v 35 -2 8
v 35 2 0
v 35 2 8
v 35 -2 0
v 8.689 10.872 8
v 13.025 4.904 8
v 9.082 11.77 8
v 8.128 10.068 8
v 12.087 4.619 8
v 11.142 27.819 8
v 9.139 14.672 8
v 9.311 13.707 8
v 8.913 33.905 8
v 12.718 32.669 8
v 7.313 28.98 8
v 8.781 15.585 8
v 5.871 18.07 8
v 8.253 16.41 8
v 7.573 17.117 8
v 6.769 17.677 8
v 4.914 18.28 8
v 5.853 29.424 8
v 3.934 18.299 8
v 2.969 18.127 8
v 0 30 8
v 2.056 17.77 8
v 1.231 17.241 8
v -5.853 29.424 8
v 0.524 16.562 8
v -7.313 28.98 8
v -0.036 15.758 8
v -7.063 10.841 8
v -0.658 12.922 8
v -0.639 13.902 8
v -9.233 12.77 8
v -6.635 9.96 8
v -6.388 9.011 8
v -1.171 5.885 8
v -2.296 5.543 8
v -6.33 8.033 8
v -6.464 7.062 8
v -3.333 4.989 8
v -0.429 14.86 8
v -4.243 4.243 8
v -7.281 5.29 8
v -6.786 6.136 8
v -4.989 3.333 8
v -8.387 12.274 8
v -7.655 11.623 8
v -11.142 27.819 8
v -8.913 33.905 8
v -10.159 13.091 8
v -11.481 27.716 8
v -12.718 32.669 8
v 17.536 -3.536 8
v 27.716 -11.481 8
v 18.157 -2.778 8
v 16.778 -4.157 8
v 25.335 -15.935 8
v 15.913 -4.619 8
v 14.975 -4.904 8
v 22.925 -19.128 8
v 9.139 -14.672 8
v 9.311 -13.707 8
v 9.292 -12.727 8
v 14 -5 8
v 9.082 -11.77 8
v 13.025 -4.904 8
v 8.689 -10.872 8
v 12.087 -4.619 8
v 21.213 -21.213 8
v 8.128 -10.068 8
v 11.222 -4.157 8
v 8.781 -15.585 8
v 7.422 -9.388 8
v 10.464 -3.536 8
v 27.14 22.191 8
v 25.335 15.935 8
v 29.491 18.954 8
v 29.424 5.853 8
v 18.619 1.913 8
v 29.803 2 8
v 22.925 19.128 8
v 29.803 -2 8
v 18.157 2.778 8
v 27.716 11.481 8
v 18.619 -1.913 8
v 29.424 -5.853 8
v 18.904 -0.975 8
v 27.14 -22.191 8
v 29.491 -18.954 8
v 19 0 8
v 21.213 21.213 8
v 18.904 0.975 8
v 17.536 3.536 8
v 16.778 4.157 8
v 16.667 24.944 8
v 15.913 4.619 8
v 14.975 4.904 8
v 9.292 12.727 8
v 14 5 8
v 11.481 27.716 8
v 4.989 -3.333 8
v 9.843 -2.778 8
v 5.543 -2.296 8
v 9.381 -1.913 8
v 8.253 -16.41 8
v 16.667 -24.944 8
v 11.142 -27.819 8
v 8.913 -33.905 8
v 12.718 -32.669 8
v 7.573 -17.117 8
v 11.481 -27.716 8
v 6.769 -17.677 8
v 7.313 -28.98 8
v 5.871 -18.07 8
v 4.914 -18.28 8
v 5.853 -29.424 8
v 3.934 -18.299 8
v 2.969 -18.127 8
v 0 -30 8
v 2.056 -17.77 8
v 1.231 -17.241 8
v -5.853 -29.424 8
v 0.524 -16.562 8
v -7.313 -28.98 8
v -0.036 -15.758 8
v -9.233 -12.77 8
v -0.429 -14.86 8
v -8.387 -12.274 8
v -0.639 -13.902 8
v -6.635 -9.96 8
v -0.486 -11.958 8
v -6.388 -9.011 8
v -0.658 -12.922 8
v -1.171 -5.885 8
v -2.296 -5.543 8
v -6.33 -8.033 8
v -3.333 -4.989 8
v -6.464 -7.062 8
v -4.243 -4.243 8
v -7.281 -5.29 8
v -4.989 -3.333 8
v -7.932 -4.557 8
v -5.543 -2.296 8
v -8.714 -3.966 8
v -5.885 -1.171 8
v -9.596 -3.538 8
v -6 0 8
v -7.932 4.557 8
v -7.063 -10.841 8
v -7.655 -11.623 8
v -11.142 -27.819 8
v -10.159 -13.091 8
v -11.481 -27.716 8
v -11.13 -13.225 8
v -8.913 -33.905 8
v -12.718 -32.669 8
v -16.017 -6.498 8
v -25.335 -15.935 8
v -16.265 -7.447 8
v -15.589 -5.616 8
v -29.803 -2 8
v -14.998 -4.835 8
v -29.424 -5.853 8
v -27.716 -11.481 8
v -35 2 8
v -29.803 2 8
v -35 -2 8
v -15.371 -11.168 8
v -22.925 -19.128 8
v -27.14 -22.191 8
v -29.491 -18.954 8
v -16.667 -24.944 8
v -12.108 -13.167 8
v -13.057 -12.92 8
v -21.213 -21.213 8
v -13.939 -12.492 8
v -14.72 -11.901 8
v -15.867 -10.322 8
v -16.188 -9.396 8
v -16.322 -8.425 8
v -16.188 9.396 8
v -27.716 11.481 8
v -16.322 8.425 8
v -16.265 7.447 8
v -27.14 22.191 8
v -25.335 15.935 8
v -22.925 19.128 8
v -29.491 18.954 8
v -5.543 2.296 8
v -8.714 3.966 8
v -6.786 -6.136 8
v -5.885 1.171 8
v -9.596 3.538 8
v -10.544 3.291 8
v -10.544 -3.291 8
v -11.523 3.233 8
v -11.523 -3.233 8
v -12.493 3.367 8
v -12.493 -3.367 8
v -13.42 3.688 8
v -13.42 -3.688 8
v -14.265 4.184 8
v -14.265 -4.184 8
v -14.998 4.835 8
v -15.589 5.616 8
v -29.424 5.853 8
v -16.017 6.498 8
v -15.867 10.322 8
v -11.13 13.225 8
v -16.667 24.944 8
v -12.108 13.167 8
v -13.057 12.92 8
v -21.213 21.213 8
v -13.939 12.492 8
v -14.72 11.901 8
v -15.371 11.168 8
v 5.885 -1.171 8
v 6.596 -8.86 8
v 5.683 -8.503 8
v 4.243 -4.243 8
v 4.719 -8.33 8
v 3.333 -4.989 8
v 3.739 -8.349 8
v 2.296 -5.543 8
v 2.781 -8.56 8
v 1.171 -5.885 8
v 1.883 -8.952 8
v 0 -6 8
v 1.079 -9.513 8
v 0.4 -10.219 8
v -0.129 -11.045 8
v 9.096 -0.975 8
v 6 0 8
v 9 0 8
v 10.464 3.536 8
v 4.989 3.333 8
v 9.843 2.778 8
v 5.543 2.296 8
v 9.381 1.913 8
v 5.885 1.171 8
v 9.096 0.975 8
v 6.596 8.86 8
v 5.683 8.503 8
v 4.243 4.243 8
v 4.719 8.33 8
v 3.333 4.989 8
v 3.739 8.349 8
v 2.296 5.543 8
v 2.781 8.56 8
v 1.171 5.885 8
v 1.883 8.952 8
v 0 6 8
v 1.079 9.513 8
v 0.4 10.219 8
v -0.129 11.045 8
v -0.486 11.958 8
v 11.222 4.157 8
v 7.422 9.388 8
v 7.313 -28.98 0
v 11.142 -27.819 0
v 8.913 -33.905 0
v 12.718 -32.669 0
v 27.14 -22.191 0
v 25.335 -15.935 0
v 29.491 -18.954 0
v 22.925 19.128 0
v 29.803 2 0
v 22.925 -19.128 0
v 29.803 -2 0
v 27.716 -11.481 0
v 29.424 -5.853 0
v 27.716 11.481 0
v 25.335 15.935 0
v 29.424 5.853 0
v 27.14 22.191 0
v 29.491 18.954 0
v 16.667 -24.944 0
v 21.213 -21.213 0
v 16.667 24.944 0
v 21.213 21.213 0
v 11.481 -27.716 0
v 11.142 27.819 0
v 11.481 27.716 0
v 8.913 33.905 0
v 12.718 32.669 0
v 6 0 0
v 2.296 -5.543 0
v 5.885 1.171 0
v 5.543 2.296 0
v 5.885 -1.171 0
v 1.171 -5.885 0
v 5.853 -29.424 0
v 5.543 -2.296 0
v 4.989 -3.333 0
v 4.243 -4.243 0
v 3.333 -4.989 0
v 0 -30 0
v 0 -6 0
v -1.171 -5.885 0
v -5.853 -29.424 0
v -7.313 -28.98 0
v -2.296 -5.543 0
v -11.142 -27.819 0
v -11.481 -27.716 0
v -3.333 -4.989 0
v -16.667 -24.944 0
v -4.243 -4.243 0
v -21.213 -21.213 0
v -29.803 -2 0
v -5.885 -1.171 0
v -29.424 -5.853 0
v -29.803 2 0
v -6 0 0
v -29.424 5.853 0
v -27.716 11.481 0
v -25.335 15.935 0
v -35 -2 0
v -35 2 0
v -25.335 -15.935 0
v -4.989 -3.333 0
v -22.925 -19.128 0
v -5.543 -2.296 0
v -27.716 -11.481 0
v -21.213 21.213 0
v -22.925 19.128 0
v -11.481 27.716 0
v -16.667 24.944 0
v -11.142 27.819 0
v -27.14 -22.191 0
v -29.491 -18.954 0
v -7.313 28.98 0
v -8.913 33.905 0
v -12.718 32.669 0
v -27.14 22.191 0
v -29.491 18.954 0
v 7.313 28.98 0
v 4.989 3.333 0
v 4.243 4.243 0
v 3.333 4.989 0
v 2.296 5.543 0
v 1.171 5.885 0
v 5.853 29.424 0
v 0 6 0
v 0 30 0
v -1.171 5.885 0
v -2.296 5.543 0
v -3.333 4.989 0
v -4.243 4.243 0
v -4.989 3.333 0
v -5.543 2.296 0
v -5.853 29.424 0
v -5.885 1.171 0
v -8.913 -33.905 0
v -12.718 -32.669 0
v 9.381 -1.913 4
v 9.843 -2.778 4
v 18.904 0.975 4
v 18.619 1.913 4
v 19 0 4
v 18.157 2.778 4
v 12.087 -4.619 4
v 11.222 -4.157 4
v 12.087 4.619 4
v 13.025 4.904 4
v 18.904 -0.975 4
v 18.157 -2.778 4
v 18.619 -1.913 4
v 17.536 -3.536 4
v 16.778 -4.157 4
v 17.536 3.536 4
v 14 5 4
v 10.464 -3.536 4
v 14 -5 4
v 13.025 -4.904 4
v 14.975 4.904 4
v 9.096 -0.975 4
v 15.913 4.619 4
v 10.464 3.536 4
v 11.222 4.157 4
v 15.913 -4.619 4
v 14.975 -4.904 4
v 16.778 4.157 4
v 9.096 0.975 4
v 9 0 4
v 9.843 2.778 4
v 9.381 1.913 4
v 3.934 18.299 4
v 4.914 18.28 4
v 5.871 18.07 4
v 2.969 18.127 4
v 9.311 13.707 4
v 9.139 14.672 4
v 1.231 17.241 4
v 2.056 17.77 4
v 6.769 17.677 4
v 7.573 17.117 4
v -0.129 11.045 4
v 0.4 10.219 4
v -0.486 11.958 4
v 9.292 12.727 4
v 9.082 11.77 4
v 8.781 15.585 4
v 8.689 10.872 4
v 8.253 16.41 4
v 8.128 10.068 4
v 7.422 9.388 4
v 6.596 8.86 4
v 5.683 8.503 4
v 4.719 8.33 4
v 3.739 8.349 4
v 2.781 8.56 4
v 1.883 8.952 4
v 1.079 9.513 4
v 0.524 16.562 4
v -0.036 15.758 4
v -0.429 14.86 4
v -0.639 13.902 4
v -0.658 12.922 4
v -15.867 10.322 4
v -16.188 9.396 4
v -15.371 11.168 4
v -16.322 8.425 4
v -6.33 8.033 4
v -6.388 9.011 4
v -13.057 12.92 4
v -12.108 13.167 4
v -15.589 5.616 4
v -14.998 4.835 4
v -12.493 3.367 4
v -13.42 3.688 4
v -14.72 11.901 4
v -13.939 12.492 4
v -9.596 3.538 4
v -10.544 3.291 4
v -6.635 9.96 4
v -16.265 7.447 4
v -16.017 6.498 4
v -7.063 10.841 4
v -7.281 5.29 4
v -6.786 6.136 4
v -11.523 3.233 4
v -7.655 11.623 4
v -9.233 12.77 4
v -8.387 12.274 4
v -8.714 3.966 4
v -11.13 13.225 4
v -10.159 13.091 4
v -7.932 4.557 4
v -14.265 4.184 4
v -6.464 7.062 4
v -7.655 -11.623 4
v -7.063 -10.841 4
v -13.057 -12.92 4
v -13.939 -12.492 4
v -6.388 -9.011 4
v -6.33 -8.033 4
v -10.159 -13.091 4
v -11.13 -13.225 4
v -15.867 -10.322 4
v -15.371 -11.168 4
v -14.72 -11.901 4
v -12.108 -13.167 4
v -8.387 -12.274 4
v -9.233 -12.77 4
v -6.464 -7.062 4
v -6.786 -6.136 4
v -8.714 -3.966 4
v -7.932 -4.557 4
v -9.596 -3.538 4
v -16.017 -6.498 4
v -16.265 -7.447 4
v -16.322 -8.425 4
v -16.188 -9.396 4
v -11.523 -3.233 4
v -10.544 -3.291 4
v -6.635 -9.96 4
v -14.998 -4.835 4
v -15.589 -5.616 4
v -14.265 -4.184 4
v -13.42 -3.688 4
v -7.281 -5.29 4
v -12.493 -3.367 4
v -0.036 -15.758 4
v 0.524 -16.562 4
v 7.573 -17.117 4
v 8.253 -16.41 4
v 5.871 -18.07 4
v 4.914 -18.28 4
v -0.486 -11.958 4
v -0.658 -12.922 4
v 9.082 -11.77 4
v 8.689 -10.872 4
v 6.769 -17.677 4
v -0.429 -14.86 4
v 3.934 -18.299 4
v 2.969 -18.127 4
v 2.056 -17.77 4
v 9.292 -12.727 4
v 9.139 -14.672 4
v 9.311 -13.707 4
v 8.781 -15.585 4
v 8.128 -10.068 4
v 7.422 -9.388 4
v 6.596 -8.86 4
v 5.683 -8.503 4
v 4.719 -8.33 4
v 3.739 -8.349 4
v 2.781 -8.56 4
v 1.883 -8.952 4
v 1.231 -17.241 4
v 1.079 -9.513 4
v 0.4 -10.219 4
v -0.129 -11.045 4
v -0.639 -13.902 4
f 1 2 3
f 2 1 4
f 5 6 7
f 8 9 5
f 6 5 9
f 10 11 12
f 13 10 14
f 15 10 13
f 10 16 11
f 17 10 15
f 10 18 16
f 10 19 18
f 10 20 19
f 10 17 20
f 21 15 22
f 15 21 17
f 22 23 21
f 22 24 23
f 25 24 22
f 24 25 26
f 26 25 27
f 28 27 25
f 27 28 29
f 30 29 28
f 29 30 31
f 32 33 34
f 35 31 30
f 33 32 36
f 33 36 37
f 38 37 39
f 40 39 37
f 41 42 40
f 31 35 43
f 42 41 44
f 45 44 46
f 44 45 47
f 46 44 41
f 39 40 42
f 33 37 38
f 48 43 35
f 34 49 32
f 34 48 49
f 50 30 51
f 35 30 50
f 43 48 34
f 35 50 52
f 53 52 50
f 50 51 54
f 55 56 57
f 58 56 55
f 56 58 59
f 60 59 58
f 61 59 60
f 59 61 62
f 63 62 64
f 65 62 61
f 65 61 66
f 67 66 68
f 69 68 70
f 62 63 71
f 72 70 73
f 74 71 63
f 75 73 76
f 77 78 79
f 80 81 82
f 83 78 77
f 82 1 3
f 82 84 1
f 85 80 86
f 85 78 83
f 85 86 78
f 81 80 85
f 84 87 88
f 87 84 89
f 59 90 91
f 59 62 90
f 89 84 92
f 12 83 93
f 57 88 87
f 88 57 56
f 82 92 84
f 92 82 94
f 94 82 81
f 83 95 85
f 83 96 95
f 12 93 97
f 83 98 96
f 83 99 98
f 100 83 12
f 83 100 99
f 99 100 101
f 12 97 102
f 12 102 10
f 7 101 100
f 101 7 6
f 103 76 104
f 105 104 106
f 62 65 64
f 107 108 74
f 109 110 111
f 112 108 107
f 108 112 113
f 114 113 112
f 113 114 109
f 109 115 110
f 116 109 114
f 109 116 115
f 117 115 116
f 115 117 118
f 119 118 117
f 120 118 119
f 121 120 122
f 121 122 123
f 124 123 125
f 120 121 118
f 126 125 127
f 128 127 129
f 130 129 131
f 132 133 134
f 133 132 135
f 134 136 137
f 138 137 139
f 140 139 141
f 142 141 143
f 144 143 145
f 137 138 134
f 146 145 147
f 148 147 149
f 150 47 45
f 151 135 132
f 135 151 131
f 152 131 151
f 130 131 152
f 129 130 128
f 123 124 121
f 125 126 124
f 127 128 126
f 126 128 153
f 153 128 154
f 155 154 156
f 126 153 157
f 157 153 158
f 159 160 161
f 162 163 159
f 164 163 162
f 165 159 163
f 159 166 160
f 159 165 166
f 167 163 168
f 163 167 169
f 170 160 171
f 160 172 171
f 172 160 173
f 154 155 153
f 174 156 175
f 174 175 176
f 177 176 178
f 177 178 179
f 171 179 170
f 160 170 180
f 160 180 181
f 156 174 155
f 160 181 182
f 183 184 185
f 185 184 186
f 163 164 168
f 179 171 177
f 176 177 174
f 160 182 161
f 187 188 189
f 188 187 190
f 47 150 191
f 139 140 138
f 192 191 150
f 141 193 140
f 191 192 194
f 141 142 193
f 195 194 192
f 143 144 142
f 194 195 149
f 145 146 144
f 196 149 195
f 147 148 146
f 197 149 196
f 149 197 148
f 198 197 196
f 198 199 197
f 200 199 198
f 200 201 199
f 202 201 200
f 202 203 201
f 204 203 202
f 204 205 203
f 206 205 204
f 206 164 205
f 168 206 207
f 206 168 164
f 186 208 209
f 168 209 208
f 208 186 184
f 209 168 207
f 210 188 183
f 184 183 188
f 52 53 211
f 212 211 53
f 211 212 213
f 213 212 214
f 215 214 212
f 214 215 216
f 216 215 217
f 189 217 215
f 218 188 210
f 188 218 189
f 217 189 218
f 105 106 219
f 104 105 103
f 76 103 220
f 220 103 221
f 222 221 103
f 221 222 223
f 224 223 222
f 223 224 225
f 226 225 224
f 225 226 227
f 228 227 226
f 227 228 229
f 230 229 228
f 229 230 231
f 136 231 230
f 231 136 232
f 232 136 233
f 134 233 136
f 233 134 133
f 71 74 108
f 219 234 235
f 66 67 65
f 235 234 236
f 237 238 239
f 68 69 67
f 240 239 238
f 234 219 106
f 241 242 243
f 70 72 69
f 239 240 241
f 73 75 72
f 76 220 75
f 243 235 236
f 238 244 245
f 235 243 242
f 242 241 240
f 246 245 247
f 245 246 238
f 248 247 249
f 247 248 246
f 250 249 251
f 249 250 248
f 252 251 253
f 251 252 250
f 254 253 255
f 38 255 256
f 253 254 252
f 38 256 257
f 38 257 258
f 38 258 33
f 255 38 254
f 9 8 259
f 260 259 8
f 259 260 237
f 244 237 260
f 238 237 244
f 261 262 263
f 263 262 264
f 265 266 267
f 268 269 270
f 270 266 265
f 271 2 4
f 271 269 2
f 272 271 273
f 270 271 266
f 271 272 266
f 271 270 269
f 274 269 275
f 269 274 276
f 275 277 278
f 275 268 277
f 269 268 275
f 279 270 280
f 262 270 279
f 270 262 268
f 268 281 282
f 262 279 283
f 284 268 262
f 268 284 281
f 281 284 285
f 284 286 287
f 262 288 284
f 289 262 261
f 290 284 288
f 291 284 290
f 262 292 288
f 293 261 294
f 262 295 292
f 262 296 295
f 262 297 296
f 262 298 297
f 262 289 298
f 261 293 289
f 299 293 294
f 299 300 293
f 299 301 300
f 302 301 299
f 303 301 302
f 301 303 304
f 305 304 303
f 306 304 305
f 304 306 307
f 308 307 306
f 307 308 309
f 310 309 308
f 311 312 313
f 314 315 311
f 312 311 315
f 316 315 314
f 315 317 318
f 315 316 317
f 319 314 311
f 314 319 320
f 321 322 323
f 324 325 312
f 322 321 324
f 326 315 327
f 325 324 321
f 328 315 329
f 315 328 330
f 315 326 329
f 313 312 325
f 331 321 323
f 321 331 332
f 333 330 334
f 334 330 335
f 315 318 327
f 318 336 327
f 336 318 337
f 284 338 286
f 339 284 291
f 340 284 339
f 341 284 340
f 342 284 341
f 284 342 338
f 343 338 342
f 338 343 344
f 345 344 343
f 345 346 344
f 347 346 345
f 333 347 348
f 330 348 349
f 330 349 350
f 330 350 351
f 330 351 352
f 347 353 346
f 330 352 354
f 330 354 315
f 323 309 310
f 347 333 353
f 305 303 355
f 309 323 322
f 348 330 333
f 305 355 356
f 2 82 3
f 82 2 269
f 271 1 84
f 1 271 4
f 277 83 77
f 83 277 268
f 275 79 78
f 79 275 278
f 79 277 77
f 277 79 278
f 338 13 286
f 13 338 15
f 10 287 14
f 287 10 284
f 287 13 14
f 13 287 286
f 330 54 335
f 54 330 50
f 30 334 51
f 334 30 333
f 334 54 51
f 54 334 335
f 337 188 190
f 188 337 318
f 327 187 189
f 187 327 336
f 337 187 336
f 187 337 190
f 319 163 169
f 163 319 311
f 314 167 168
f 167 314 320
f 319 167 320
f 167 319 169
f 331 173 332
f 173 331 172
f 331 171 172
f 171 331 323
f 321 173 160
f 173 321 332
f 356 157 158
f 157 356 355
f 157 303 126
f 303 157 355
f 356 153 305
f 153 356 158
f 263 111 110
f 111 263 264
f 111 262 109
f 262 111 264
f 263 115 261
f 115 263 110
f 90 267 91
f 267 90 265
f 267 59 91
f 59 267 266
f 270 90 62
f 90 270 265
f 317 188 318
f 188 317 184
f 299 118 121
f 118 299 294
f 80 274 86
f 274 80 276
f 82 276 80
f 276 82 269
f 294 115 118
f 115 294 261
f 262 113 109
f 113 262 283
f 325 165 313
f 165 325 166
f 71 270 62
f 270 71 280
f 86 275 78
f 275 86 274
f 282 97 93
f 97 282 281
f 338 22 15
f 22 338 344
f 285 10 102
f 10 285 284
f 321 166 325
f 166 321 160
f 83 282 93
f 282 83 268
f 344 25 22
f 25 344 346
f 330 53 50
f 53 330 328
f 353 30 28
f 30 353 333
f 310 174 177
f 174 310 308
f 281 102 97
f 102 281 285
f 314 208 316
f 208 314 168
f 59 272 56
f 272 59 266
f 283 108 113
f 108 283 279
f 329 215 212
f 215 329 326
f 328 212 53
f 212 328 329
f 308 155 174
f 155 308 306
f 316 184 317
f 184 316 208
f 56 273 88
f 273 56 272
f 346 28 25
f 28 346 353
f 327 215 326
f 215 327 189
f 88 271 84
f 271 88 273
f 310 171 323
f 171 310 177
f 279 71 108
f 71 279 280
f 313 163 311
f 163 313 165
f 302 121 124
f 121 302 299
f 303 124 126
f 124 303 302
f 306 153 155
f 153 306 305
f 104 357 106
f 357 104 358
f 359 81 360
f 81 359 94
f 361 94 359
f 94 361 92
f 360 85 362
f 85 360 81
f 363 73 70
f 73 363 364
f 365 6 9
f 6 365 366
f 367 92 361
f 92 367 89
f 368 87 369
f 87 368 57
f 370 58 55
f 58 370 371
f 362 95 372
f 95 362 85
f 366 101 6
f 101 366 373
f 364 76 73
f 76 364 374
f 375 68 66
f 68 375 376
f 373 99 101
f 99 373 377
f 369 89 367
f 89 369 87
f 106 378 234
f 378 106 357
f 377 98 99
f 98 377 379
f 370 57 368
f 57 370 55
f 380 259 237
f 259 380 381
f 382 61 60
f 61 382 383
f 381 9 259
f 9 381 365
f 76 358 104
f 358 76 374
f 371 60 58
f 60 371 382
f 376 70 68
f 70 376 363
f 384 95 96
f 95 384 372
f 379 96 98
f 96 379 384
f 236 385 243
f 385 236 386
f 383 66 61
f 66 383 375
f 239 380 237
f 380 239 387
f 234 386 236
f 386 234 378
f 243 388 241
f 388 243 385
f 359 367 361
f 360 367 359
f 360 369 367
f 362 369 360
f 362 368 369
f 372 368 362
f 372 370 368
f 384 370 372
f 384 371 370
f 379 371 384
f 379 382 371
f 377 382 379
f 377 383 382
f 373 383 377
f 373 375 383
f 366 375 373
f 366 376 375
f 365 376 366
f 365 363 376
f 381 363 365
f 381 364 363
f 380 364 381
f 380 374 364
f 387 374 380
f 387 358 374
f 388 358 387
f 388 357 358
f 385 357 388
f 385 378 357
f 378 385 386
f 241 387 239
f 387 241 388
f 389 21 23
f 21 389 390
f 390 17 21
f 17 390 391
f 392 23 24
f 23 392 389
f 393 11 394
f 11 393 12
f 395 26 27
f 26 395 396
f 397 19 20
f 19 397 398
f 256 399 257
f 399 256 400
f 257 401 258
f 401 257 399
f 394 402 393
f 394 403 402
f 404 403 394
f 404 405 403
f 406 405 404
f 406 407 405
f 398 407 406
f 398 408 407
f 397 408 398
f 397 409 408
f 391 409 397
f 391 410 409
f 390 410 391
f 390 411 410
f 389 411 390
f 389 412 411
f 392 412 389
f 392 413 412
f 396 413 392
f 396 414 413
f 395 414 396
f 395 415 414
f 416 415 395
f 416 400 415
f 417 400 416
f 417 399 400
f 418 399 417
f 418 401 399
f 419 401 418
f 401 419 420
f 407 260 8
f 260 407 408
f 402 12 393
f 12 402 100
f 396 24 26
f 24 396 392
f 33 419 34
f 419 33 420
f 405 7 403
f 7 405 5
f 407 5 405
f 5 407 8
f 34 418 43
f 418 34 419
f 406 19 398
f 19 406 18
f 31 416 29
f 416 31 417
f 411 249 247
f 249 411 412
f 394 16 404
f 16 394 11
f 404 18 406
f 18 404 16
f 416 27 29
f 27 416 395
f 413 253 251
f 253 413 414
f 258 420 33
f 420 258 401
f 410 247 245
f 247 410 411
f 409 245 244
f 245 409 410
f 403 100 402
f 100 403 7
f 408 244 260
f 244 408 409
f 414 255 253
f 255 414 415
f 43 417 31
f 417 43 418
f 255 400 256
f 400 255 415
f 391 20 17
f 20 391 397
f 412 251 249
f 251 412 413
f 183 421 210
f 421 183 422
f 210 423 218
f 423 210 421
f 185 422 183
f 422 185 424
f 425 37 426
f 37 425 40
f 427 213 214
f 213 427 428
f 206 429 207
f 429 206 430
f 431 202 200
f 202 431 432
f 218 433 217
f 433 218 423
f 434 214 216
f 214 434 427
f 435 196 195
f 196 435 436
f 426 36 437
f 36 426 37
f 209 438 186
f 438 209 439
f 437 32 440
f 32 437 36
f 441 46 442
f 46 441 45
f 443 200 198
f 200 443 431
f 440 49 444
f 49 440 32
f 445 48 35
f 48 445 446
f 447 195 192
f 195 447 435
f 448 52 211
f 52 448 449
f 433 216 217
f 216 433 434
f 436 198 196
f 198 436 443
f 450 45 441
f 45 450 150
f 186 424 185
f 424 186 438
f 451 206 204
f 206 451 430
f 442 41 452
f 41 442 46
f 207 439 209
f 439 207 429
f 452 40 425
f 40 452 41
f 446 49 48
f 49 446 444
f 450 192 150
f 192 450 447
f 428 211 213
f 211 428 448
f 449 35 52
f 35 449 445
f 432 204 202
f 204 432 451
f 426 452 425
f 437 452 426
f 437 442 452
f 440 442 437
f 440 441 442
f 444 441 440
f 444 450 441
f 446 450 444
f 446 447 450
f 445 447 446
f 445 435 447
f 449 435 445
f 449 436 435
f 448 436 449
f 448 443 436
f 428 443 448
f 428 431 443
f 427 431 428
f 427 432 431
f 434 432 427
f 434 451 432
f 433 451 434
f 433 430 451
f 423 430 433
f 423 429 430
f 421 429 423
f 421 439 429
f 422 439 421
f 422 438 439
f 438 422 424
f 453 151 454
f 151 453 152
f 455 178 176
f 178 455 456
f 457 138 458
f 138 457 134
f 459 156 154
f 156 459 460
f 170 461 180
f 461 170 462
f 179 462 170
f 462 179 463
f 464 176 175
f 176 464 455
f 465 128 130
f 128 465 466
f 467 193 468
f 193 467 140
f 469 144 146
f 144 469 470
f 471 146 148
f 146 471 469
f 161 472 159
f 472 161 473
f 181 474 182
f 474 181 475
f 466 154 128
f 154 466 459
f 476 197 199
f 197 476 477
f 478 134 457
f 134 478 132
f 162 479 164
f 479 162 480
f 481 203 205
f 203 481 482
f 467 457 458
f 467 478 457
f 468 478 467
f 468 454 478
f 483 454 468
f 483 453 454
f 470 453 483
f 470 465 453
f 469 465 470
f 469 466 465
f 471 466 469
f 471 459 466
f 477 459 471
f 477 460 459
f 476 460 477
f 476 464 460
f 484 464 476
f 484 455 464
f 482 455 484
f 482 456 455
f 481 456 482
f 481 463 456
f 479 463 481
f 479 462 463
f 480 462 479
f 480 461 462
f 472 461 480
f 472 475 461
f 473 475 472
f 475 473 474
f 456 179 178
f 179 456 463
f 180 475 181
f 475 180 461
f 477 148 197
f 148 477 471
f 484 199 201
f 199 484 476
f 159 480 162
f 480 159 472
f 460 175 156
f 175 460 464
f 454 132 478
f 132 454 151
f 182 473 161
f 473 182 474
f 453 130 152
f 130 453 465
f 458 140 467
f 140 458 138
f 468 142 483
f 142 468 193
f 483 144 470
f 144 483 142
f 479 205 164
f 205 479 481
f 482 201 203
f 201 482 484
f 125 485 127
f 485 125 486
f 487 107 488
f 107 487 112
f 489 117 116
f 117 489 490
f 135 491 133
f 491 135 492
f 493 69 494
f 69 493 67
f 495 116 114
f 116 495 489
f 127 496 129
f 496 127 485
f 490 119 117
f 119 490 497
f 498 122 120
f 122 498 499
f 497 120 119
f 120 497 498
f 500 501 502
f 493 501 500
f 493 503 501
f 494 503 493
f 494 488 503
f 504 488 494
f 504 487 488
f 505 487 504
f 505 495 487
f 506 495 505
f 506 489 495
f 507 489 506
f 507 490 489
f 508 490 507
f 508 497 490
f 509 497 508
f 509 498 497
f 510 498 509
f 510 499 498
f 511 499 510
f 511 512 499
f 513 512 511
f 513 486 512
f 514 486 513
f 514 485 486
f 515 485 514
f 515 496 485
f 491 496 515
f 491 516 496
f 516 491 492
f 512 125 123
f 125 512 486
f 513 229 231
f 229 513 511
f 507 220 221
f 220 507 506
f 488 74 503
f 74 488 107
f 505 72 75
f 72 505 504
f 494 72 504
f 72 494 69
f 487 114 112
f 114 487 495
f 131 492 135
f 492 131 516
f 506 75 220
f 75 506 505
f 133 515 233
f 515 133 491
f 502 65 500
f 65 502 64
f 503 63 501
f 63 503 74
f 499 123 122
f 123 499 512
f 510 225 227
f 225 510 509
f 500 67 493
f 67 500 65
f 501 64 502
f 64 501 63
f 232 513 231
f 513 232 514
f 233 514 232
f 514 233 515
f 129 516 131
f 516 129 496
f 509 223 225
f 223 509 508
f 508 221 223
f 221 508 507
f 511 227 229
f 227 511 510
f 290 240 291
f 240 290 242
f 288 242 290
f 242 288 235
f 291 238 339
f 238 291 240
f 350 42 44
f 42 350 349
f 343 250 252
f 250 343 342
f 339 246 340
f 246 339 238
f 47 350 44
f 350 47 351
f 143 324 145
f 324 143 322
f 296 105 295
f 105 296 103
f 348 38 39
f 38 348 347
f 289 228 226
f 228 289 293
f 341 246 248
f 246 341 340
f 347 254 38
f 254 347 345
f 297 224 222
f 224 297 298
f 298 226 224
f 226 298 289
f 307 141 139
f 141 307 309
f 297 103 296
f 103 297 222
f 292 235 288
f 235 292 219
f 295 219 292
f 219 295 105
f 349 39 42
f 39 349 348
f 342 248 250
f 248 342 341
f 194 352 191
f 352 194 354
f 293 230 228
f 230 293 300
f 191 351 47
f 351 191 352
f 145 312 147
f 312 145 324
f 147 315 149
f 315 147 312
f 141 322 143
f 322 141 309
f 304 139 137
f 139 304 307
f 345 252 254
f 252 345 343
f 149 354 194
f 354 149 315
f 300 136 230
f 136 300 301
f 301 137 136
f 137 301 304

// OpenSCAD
$fn = 32;

// ----------------------------------------------------------------------
// Spur blank: lightened gear blank
// ----------------------------------------------------------------------

// --- parameters (mm) ---
disc_r = 30;              // blank root radius
disc_t = 8;               // blank thickness
n_teeth = 10;             // stub tooth count
tooth_w = 4;              // tooth width at the root
tooth_h = 5;              // tooth height above the root
bore_r = 6;               // central bore radius
ring_r = 14;              // lightening pocket ring radius
pocket_r = 5;             // lightening pocket radius
fit_tol = 0.05;           // tolerance for press fits, mm
free_tol = 0.3;           // tolerance for clearance fits, mm

out_r = disc_r + tooth_h;  // tip radius
bbox_x = 70.0;  // measured width over the teeth
bbox_y = 67.81;  // measured depth over the teeth

difference() {
union() {
  cylinder(r = disc_r, h = disc_t);
  for (i = [0 : n_teeth - 1])
    rotate([0, 0, i * 360 / n_teeth])
      translate([disc_r - 1, -tooth_w / 2, 0])
        cube([tooth_h + 1, tooth_w, disc_t]);
}
  translate([0, 0, -1]) cylinder(r = bore_r, h = disc_t + 2);
  for (i = [0 : 5])
    rotate([0, 0, i * 72])
      translate([ring_r, 0, disc_t - 4])
        cylinder(r = pocket_r, h = 5);
}
